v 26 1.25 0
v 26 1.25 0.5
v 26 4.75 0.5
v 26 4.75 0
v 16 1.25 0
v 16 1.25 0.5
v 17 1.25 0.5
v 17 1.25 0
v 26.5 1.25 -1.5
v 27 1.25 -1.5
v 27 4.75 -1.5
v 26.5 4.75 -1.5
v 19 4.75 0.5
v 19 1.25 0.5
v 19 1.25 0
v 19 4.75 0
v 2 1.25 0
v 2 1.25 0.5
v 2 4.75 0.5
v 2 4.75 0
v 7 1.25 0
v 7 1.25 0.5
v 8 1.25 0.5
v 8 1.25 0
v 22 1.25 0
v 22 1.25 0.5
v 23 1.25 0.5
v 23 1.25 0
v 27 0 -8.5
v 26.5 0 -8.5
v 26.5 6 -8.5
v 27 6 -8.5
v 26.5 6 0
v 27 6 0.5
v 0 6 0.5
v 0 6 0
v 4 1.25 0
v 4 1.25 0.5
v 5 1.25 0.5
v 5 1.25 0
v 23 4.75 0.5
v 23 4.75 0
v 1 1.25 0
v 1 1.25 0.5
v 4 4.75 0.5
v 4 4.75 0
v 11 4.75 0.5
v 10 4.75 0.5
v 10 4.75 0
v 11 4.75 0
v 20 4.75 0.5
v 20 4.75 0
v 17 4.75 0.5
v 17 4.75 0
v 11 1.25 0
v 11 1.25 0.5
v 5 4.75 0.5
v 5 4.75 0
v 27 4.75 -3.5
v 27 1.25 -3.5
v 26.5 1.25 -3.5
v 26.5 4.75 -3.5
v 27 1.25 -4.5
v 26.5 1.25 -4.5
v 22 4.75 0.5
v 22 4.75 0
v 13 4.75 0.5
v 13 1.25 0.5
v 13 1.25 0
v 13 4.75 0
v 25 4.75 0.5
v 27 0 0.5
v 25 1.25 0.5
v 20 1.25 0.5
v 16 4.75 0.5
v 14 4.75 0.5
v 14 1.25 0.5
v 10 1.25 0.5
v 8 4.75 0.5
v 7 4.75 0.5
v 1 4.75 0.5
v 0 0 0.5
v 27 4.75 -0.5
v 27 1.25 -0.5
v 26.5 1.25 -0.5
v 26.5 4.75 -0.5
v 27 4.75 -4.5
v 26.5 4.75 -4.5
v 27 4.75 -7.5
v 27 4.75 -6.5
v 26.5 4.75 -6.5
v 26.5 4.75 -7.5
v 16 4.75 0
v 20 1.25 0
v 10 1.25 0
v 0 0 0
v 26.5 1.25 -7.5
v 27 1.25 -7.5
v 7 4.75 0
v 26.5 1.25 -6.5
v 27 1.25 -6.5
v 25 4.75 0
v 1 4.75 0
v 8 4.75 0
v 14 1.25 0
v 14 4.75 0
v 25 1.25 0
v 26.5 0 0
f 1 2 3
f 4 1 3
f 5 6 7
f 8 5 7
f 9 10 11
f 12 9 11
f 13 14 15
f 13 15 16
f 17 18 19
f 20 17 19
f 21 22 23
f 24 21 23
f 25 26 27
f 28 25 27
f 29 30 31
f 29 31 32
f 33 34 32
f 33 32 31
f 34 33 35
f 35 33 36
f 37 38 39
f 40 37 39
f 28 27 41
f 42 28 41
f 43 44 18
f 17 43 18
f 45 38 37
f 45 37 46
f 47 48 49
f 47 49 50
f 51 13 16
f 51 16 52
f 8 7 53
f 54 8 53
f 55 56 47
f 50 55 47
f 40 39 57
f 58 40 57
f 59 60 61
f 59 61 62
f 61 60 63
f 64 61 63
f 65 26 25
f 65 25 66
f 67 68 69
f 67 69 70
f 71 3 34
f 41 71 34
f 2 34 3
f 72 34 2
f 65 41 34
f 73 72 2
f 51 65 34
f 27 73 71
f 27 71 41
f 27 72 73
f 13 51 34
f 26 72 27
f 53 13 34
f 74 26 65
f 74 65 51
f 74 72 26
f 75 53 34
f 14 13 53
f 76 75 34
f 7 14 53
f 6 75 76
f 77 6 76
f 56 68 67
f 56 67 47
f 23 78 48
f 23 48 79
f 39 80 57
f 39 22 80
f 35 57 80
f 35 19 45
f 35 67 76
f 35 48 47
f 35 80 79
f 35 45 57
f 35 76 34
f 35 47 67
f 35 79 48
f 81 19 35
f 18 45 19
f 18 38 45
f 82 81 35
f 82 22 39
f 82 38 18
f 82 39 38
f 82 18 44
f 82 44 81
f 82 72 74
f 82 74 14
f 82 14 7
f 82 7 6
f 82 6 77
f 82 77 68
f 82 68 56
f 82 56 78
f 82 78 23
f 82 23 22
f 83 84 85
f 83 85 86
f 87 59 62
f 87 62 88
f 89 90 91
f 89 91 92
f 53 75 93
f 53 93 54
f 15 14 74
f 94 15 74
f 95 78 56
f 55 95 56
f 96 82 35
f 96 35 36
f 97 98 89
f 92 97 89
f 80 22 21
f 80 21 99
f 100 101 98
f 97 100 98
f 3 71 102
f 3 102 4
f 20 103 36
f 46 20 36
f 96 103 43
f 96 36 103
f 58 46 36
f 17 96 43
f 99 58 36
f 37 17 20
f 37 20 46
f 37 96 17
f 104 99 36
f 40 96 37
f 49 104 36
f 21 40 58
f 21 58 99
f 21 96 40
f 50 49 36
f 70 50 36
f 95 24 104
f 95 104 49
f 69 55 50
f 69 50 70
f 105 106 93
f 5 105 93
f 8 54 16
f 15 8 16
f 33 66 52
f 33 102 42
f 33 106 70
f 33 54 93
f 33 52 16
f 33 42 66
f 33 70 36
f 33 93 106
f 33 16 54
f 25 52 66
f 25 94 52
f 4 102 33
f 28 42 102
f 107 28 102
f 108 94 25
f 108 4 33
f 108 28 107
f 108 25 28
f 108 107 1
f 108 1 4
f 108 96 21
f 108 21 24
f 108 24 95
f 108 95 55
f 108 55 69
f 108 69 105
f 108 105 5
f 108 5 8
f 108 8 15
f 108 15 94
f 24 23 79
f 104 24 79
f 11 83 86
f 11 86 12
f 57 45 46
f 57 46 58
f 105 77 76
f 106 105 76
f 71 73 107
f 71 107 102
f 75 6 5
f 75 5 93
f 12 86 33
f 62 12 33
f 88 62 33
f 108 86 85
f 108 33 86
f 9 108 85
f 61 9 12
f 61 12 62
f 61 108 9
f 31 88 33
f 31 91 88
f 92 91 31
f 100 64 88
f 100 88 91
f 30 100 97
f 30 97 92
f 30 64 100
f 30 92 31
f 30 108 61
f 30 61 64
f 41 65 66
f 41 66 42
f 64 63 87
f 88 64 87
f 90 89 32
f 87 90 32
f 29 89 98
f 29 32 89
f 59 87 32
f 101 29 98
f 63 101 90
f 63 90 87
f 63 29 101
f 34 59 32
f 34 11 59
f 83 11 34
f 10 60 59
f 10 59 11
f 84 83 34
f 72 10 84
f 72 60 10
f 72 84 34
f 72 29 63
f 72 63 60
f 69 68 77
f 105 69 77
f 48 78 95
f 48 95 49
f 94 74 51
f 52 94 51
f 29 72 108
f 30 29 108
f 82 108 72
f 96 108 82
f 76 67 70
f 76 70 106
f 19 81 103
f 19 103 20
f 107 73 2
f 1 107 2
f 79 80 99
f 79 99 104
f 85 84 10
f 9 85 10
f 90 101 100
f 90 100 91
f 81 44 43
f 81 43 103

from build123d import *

# Parameters (mm, degrees)
EXTRUDE_1_DEPTH     = 6
SKETCH_2_W          = 1
SKETCH_2_H          = 3.5
CUT_EXTRUDE_1_DEPTH = 30.086079144
SKETCH_3_W          = 1
SKETCH_3_H          = 3.5
CUT_EXTRUDE_2_DEPTH = 6


with BuildPart() as part:
    # 草图1 → 凸台-拉伸1 (new body)
    with BuildSketch(Plane(origin=(0, 0, 0), x_dir=(1, 0, 0), z_dir=(0, 1, 0))):
        Polygon((0, 0), (26.5, 0), (26.5, 8.5), (27, 8.5), (27, -0.5), (0, -0.5), align=None)
    extrude(amount=EXTRUDE_1_DEPTH)

    # 草图2 → 切除-拉伸1 (cut, through all)
    with BuildSketch(Plane.XY.offset(0.5)):
        with Locations((1.5, 3)):
            Rectangle(SKETCH_2_W, SKETCH_2_H)
        with Locations((4.5, 3)):
            Rectangle(SKETCH_2_W, SKETCH_2_H)
        with Locations((7.5, 3)):
            Rectangle(SKETCH_2_W, SKETCH_2_H)
        with Locations((10.5, 3)):
            Rectangle(SKETCH_2_W, SKETCH_2_H)
        with Locations((13.5, 3)):
            Rectangle(SKETCH_2_W, SKETCH_2_H)
        with Locations((16.5, 3)):
            Rectangle(SKETCH_2_W, SKETCH_2_H)
        with Locations((19.5, 3)):
            Rectangle(SKETCH_2_W, SKETCH_2_H)
        with Locations((22.5, 3)):
            Rectangle(SKETCH_2_W, SKETCH_2_H)
        with Locations((25.5, 3)):
            Rectangle(SKETCH_2_W, SKETCH_2_H)
    extrude(amount=-CUT_EXTRUDE_1_DEPTH, mode=Mode.SUBTRACT)

    # 草图3 → 切除-拉伸2 (cut)
    with BuildSketch(Plane(origin=(27, 0, 0), x_dir=(0, 0, -1), z_dir=(1, 0, 0))):
        with Locations((1, 3)):
            Rectangle(SKETCH_3_W, SKETCH_3_H)
        with Locations((4, 3)):
            Rectangle(SKETCH_3_W, SKETCH_3_H)
        with Locations((7, 3)):
            Rectangle(SKETCH_3_W, SKETCH_3_H)
    extrude(amount=-CUT_EXTRUDE_2_DEPTH, mode=Mode.SUBTRACT)


solid = part.part
